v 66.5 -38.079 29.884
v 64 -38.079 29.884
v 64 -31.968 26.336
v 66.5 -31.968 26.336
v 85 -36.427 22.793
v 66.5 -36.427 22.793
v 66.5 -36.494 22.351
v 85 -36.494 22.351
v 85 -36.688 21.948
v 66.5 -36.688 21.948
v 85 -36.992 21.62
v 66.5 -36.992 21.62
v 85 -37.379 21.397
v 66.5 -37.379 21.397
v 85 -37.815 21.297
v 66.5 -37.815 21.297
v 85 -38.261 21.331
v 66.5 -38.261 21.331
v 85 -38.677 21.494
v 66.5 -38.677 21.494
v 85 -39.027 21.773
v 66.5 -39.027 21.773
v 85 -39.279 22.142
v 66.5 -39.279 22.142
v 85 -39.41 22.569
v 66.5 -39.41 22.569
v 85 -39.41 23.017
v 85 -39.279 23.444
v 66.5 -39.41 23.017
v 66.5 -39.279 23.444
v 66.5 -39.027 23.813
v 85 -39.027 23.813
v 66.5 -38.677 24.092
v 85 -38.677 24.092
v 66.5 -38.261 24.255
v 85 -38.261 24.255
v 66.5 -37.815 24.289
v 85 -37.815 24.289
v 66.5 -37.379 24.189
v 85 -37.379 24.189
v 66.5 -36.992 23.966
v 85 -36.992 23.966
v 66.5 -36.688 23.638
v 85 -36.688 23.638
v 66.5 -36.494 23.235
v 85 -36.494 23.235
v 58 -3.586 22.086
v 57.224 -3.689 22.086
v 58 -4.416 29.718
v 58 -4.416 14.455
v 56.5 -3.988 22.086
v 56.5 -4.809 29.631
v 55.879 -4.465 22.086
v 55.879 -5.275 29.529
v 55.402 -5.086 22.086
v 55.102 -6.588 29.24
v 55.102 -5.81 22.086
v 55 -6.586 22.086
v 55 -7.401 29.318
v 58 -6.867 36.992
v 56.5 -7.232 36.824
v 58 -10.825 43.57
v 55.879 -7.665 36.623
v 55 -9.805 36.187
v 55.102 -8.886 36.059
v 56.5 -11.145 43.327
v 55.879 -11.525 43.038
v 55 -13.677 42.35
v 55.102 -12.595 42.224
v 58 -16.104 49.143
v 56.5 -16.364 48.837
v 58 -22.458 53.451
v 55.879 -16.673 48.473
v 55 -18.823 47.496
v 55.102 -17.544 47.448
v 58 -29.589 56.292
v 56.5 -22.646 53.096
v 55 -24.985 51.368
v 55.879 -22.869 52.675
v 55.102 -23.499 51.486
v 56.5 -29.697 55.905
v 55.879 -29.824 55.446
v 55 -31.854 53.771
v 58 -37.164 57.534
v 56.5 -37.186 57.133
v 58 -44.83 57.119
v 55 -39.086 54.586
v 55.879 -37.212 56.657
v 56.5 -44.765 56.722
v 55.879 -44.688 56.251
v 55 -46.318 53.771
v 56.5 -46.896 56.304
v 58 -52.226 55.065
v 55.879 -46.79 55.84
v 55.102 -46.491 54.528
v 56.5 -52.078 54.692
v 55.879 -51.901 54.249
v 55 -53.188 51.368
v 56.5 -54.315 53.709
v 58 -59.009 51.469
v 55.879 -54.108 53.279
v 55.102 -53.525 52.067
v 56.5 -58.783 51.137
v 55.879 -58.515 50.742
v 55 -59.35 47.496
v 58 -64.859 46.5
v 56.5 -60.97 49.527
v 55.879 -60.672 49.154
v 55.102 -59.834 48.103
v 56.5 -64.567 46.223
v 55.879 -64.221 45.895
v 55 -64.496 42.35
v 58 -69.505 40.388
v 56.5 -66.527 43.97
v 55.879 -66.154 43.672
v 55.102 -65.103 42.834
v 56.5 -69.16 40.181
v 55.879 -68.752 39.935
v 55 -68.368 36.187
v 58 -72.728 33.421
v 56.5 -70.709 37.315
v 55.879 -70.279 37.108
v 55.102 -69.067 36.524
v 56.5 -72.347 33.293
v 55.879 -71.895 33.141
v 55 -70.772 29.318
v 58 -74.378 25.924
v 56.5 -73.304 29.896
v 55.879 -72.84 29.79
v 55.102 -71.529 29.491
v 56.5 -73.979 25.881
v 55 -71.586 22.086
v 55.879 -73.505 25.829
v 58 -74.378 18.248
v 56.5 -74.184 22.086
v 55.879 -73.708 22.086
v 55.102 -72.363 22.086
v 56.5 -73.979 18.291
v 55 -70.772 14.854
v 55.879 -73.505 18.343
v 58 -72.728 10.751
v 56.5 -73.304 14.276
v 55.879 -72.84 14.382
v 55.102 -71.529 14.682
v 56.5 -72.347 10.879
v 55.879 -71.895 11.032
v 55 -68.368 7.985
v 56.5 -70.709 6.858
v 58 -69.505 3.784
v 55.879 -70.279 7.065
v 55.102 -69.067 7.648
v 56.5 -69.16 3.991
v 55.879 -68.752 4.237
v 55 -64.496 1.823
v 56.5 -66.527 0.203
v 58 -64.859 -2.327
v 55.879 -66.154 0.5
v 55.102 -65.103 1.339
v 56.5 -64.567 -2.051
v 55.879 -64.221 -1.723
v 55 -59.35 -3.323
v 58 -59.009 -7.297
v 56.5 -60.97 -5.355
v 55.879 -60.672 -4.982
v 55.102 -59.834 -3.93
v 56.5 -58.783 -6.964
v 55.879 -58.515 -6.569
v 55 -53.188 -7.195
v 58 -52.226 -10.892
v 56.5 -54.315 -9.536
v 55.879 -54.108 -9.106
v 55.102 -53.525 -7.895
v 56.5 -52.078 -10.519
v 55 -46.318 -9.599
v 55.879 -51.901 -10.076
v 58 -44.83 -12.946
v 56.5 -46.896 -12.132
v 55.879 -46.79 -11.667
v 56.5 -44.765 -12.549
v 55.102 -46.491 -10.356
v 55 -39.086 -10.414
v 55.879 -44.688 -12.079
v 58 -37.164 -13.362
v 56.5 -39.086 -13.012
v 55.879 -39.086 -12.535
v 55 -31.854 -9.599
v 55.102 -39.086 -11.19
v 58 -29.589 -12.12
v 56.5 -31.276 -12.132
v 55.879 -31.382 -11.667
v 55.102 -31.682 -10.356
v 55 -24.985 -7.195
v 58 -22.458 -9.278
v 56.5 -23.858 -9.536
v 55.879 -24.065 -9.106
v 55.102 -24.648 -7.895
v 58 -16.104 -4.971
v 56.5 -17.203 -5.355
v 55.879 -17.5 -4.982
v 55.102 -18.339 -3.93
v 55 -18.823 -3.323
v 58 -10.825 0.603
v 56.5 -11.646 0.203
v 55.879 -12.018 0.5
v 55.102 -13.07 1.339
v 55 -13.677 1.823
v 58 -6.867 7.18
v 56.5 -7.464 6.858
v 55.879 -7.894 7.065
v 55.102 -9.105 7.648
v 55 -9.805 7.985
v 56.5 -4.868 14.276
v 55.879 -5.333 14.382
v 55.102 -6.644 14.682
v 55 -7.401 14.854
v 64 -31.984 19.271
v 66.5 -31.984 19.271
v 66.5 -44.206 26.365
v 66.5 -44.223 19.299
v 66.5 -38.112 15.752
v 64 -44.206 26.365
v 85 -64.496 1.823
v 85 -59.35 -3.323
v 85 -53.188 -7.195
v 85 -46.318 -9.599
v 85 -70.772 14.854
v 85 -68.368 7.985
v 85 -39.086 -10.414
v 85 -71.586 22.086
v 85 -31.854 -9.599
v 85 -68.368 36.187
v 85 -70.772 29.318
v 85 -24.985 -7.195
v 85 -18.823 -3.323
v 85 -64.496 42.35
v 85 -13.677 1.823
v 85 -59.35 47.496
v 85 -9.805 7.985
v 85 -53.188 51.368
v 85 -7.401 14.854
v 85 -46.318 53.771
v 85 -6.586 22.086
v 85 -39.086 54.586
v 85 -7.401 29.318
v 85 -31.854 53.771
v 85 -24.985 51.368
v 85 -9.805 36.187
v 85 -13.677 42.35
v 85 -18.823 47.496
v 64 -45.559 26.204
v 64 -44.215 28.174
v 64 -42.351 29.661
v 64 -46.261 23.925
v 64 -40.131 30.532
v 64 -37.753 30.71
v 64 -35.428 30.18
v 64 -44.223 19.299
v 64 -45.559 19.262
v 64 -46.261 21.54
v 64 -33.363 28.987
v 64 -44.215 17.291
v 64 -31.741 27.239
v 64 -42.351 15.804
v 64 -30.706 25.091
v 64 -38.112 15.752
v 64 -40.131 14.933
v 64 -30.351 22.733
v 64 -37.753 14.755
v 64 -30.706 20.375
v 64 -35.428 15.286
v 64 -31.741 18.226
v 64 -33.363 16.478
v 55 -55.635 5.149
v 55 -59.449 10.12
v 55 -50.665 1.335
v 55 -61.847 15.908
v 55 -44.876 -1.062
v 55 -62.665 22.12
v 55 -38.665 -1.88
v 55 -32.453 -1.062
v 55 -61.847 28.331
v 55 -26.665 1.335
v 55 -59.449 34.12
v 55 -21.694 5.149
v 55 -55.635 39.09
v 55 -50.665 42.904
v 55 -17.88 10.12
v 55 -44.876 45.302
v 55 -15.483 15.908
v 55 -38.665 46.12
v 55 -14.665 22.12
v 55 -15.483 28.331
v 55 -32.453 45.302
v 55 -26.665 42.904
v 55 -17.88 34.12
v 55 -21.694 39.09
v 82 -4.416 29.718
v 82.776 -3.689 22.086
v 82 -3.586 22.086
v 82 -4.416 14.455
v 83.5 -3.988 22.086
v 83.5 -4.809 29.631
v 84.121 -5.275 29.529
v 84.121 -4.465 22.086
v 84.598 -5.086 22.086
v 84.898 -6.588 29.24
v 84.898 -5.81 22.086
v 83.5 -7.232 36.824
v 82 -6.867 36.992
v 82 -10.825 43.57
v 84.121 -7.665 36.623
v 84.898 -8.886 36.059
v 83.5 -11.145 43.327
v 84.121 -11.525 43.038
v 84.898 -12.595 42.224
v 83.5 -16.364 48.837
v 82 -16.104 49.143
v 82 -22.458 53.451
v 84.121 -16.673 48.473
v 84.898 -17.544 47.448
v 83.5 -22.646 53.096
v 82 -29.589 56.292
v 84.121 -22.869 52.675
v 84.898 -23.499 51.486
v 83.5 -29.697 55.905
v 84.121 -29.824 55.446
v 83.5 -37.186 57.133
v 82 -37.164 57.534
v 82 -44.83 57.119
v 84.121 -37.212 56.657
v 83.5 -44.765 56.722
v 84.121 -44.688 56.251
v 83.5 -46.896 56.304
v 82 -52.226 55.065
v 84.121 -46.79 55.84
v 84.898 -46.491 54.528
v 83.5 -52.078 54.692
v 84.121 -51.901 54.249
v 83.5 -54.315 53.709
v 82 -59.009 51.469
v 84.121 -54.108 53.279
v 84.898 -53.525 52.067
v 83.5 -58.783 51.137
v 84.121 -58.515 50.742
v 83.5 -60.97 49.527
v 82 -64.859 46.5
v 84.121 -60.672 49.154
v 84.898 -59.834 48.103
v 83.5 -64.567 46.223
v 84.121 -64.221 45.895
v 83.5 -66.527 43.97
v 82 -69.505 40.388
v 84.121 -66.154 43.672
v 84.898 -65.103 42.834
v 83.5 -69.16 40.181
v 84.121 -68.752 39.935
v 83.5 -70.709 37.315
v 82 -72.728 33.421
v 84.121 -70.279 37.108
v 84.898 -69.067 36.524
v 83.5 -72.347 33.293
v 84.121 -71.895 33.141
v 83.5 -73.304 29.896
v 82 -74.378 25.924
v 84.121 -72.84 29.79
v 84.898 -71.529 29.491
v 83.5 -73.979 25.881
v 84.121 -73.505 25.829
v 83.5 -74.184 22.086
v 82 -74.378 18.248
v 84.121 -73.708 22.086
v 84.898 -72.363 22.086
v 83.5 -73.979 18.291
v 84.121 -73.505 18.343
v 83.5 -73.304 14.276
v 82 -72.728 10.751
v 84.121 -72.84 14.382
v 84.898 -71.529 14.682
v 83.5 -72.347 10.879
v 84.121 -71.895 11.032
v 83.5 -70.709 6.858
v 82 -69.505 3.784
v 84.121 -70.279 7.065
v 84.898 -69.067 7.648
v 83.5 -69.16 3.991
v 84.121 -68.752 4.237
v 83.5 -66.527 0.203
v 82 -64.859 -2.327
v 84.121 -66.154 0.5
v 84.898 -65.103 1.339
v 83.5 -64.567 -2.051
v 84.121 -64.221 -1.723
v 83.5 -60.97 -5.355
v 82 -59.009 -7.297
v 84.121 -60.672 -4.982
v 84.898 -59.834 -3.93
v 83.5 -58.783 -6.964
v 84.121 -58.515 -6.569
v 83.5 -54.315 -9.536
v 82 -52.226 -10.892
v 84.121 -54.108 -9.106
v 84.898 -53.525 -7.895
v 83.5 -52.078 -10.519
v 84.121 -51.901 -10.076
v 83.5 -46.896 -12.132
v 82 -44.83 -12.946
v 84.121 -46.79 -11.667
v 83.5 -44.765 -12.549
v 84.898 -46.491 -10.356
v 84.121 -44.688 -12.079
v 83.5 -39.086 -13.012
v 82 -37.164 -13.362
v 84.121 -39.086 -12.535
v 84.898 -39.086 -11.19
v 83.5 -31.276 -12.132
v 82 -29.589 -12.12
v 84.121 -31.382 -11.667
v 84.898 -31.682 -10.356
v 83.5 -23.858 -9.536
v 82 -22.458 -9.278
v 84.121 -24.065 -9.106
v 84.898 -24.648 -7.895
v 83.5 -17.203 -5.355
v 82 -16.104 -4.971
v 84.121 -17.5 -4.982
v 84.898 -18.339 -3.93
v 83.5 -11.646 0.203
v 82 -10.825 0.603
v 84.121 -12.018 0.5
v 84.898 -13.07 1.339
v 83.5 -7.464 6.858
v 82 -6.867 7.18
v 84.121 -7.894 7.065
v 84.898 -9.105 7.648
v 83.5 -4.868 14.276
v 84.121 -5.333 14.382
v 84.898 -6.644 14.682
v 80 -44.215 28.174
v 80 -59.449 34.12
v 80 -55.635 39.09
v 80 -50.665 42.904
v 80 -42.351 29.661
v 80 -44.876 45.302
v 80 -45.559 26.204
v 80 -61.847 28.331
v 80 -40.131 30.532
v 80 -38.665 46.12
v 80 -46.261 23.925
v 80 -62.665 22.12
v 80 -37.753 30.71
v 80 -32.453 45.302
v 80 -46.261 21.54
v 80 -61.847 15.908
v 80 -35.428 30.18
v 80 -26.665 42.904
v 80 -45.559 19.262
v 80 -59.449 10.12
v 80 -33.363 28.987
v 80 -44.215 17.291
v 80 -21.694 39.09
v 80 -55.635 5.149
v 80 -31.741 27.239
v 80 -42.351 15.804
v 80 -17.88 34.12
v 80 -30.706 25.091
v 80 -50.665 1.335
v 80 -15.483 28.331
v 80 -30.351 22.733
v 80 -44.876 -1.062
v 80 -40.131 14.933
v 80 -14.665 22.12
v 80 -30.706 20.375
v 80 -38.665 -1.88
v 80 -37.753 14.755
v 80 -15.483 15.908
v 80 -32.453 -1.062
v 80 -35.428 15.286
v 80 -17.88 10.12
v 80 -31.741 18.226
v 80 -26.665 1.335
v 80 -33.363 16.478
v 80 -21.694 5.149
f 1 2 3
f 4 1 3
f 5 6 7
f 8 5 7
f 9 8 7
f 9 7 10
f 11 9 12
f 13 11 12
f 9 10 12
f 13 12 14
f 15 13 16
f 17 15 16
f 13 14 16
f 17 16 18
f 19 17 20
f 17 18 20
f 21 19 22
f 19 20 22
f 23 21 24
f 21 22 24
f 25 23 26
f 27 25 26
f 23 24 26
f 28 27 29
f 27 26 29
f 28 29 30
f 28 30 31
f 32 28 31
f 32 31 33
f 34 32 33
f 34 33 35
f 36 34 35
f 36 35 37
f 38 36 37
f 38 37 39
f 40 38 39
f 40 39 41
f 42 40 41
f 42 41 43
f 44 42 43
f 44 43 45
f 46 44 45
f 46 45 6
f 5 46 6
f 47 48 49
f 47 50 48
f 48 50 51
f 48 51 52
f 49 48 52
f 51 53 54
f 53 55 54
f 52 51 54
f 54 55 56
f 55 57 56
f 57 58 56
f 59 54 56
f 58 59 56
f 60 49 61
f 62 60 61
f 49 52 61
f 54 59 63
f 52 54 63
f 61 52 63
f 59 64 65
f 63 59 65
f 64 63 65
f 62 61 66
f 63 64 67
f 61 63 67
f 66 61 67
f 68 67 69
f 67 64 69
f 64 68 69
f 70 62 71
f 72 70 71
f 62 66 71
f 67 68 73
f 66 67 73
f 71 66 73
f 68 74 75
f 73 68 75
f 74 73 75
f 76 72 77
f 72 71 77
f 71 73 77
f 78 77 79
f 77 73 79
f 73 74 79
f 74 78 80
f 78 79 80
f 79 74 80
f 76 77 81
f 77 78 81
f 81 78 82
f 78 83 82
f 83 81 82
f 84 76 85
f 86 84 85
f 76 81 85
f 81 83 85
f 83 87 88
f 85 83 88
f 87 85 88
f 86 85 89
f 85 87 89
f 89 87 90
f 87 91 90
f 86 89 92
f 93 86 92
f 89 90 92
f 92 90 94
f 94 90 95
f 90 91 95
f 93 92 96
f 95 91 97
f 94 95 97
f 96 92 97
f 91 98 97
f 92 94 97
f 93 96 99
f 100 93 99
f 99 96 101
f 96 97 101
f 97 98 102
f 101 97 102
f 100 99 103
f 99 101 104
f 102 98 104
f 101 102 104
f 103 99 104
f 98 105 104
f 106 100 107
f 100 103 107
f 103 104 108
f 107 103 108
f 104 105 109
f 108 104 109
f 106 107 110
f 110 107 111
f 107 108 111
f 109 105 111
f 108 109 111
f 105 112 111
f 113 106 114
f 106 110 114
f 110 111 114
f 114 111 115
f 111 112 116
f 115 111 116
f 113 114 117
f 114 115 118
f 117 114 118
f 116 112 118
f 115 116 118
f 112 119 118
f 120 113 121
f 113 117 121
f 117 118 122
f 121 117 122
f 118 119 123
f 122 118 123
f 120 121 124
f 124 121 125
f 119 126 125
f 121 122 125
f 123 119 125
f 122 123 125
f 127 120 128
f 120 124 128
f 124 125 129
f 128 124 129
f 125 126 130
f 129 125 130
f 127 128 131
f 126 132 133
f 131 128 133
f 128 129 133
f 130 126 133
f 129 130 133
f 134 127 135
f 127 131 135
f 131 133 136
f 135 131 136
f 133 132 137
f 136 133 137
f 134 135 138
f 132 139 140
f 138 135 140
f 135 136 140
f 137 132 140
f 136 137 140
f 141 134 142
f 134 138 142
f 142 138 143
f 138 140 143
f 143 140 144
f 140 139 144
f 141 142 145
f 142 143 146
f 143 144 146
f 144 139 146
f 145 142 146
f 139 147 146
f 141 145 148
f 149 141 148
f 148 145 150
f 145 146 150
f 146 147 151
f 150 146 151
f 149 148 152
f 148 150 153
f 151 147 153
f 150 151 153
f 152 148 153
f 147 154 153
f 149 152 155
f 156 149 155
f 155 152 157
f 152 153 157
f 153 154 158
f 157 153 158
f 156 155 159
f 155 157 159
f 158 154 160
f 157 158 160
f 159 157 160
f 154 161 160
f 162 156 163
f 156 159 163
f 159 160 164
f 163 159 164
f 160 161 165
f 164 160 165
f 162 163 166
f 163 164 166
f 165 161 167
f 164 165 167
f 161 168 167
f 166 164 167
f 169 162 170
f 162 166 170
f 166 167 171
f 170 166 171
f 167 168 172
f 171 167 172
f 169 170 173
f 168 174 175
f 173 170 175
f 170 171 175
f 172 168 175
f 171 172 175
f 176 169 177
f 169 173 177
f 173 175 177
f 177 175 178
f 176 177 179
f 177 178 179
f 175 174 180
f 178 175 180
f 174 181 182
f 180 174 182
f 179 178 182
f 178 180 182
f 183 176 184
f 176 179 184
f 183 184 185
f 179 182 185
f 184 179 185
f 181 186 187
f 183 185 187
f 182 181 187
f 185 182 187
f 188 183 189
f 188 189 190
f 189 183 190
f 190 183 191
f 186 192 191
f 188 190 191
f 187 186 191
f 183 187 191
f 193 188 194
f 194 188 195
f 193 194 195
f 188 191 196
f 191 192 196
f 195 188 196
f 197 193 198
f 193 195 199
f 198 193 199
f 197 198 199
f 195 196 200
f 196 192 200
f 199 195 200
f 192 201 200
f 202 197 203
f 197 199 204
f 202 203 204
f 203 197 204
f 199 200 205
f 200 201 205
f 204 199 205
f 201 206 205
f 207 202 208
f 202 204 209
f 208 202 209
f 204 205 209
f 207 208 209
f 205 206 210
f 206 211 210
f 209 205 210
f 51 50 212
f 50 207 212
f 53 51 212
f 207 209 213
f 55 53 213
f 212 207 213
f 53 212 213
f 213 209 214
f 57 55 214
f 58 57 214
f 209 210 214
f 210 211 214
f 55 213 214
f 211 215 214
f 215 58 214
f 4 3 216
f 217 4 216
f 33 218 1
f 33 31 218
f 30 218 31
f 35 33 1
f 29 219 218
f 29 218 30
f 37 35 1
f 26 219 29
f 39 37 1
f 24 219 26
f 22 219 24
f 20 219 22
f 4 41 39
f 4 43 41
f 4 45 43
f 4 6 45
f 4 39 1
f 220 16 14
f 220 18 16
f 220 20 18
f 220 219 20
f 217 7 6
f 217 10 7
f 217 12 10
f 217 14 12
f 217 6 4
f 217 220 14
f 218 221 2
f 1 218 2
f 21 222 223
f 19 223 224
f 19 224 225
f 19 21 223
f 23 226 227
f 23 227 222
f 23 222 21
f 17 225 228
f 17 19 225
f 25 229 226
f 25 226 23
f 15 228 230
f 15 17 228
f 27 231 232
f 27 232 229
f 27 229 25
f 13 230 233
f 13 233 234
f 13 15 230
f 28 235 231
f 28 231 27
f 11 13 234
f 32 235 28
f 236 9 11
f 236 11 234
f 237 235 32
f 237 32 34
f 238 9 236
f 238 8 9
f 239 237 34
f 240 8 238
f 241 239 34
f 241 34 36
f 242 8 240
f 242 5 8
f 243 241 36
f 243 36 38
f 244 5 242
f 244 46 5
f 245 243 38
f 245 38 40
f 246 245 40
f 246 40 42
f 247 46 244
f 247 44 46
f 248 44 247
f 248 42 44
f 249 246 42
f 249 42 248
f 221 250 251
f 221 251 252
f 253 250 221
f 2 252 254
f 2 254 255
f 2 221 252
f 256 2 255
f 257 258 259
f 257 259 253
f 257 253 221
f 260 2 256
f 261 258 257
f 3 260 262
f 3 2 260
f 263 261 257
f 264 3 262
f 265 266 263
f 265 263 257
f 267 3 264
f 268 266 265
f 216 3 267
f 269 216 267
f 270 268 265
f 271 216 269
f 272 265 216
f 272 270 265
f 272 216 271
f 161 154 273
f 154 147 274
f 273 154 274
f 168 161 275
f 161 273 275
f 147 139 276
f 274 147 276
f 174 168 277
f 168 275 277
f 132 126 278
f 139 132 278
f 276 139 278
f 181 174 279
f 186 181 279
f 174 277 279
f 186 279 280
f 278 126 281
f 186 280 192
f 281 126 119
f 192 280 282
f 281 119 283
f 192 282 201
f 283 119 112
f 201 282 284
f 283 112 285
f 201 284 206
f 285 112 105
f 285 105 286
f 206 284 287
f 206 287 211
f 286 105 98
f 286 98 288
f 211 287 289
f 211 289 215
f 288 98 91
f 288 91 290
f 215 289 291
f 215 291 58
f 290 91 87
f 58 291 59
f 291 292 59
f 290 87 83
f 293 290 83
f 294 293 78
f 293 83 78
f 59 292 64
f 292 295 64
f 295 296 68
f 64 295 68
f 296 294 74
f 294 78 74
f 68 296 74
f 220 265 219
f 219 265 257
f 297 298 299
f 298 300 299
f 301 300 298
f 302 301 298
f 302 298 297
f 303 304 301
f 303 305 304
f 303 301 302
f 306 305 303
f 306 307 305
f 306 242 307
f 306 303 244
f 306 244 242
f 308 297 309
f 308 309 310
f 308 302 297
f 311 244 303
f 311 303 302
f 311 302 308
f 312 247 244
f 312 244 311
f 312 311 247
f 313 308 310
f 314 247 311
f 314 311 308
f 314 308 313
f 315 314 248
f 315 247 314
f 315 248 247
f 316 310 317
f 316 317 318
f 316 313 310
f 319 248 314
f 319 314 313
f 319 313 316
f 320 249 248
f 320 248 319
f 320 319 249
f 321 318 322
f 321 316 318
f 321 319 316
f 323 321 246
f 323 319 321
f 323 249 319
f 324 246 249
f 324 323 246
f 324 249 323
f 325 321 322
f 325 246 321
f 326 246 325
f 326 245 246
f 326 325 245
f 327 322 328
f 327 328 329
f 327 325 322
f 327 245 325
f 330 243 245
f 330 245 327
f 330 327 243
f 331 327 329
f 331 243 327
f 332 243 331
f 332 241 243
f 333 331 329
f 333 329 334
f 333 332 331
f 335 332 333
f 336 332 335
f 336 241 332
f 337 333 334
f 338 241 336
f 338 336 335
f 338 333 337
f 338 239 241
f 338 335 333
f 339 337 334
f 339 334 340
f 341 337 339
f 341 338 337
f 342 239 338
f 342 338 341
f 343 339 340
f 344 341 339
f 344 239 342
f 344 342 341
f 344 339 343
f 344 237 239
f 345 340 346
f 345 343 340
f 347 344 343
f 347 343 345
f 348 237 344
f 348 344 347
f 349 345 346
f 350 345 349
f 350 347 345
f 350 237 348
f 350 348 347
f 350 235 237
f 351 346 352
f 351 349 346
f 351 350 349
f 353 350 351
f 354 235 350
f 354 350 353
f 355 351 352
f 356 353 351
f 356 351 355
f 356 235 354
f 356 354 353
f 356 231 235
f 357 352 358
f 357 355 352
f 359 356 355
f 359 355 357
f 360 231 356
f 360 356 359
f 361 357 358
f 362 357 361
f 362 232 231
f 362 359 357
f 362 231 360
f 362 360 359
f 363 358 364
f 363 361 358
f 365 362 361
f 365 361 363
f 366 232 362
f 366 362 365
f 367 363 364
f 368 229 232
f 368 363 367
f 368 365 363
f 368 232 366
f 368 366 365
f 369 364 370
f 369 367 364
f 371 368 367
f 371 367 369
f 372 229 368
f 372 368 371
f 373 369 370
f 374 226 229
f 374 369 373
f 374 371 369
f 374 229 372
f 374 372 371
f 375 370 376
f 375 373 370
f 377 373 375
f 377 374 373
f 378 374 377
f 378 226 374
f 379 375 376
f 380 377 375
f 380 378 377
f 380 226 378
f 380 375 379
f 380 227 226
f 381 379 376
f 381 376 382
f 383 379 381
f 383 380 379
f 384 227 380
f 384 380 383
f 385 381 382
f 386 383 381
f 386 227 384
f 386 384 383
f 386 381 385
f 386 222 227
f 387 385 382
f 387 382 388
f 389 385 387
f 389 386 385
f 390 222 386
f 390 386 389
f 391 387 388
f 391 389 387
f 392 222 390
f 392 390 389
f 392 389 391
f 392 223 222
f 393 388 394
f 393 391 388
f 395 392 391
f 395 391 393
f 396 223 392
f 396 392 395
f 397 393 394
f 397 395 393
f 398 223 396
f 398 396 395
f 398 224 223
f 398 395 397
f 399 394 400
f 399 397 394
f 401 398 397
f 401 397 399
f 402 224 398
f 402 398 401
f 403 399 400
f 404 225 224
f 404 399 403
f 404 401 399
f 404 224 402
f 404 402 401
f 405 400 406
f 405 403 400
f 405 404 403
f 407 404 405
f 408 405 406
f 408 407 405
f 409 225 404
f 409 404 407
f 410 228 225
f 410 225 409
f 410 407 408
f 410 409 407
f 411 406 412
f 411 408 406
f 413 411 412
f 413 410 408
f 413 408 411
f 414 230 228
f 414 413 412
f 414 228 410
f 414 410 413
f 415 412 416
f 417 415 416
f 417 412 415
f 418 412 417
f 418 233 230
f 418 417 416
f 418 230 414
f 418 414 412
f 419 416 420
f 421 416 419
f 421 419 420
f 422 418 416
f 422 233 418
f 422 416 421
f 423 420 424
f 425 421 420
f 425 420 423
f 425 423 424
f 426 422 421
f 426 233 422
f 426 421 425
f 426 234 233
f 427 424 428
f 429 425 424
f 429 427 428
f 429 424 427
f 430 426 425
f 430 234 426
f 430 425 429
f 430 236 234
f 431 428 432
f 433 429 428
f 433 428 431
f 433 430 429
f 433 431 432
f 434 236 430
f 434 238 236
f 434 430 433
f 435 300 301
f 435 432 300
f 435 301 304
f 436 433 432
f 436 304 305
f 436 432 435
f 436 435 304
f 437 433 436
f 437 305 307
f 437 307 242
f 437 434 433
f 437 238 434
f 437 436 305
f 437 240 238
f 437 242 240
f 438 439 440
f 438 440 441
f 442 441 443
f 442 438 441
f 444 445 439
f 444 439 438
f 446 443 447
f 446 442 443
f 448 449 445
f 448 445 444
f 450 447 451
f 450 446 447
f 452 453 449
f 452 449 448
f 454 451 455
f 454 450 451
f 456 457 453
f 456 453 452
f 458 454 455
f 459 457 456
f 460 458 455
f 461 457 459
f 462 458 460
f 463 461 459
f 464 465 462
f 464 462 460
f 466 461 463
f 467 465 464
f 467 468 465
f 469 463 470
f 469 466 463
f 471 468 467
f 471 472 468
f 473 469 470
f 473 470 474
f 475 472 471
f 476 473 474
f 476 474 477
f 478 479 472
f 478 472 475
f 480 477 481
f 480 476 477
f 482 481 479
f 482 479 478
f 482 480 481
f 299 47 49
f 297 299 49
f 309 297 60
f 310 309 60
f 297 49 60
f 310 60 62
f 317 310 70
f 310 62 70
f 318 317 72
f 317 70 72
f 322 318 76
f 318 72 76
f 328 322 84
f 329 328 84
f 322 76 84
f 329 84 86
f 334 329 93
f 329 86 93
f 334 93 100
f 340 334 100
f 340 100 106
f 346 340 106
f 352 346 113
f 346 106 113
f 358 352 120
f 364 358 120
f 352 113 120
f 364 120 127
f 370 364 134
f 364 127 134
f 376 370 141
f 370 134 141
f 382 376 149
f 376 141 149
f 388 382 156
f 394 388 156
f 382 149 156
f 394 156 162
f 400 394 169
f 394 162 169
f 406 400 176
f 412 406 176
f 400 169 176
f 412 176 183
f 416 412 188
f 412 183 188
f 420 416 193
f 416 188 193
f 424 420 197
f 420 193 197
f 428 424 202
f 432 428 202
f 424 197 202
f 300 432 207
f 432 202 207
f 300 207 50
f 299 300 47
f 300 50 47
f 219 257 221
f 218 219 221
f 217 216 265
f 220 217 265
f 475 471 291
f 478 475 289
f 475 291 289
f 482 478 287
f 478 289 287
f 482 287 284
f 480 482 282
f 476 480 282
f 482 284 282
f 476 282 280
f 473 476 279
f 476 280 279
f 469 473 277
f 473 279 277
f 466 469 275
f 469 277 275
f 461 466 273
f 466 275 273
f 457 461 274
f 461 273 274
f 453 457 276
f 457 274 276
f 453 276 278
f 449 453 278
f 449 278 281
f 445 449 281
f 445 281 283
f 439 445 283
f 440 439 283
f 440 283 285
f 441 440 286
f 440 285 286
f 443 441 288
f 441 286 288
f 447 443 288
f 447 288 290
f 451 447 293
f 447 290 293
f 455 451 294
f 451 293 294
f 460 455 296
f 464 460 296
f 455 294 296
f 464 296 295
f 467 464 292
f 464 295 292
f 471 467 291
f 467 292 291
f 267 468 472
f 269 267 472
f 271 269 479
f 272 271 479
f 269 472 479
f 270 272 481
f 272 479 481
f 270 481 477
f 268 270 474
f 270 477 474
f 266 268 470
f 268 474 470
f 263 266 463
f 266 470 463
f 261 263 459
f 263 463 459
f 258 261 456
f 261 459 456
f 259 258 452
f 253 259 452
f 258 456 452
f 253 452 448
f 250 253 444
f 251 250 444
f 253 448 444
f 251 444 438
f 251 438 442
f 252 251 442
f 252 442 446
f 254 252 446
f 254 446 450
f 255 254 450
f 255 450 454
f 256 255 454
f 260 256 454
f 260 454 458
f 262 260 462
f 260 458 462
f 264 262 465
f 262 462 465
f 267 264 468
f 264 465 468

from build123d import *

# Parameters (mm, degrees)
SKETCH008_R     = 35.5
PAD007_DEPTH    = 30
SKETCH009_R     = 24
POCKET001_DEPTH = 25
SKETCH010_R     = 8
PAD008_DEPTH    = 16
POCKET002_DEPTH = 2.5
SKETCH012_R     = 1.5
POCKET003_DEPTH = 25
FILLET_R        = 3
FILLET001_R     = 3


with BuildPart() as part:
    # Sketch008 → Pad007 (new body)
    with BuildSketch(Plane.YZ):
        with Locations((-2.086398, 2.086246)):
            Circle(SKETCH008_R)
    extrude(amount=PAD007_DEPTH)

    # Sketch009 (on Face2 of Pad007) → Pocket001 (cut)
    with BuildSketch(Plane(origin=(0, 0, 0), x_dir=(0, 1, 0), z_dir=(-1, 0, 0))):
        with Locations((-1.664763, -2.119737)):
            Circle(SKETCH009_R)
    extrude(amount=-POCKET001_DEPTH, mode=Mode.SUBTRACT)

    # Sketch010 (on Face5 of Pocket001) → Pad008 (join)
    with BuildSketch(Plane(origin=(25, 0, 0), x_dir=(0, 1, 0), z_dir=(-1, 0, 0))):
        with Locations((-1.350817, -2.732668)):
            Circle(SKETCH010_R)
    extrude(amount=PAD008_DEPTH)

    # Sketch011 (on Face7 of Pad008) → Pocket002 (cut)
    with BuildSketch(Plane(origin=(9, 0, 0), x_dir=(0, 1, 0), z_dir=(-1, 0, 0))):
        Polygon((-1.111872, 4.248012), (-7.222761, 0.700721), (-7.206161, -6.365109), (-1.078672, -9.883648), (5.032216, -6.336357), (5.015616, 0.729474), align=None)
    extrude(amount=-POCKET002_DEPTH, mode=Mode.SUBTRACT)

    # Sketch012 (on Face14 of Pocket002) → Pocket003 (cut)
    with BuildSketch(Plane(origin=(11.5, 0, 0), x_dir=(0, 1, 0), z_dir=(-1, 0, 0))):
        with Locations((-0.927213, -2.793039)):
            Circle(SKETCH012_R)
    extrude(amount=-POCKET003_DEPTH, mode=Mode.SUBTRACT)

    # Fillet
    fillet_edges = [part.edges().sort_by_distance(p)[0] for p in [
        (0, -37.586398, 2.086246),
    ]]
    fillet(fillet_edges, radius=FILLET_R)

    # Fillet001
    fillet001_edges = [part.edges().sort_by_distance(p)[0] for p in [
        (30, -37.586398, 2.086246),
    ]]
    fillet(fillet001_edges, radius=FILLET001_R)


with BuildPart() as part_1:
    # Body003 placement: moved
    add(part.part.moved(Location((55, -37, 20))))


solid = part_1.part
